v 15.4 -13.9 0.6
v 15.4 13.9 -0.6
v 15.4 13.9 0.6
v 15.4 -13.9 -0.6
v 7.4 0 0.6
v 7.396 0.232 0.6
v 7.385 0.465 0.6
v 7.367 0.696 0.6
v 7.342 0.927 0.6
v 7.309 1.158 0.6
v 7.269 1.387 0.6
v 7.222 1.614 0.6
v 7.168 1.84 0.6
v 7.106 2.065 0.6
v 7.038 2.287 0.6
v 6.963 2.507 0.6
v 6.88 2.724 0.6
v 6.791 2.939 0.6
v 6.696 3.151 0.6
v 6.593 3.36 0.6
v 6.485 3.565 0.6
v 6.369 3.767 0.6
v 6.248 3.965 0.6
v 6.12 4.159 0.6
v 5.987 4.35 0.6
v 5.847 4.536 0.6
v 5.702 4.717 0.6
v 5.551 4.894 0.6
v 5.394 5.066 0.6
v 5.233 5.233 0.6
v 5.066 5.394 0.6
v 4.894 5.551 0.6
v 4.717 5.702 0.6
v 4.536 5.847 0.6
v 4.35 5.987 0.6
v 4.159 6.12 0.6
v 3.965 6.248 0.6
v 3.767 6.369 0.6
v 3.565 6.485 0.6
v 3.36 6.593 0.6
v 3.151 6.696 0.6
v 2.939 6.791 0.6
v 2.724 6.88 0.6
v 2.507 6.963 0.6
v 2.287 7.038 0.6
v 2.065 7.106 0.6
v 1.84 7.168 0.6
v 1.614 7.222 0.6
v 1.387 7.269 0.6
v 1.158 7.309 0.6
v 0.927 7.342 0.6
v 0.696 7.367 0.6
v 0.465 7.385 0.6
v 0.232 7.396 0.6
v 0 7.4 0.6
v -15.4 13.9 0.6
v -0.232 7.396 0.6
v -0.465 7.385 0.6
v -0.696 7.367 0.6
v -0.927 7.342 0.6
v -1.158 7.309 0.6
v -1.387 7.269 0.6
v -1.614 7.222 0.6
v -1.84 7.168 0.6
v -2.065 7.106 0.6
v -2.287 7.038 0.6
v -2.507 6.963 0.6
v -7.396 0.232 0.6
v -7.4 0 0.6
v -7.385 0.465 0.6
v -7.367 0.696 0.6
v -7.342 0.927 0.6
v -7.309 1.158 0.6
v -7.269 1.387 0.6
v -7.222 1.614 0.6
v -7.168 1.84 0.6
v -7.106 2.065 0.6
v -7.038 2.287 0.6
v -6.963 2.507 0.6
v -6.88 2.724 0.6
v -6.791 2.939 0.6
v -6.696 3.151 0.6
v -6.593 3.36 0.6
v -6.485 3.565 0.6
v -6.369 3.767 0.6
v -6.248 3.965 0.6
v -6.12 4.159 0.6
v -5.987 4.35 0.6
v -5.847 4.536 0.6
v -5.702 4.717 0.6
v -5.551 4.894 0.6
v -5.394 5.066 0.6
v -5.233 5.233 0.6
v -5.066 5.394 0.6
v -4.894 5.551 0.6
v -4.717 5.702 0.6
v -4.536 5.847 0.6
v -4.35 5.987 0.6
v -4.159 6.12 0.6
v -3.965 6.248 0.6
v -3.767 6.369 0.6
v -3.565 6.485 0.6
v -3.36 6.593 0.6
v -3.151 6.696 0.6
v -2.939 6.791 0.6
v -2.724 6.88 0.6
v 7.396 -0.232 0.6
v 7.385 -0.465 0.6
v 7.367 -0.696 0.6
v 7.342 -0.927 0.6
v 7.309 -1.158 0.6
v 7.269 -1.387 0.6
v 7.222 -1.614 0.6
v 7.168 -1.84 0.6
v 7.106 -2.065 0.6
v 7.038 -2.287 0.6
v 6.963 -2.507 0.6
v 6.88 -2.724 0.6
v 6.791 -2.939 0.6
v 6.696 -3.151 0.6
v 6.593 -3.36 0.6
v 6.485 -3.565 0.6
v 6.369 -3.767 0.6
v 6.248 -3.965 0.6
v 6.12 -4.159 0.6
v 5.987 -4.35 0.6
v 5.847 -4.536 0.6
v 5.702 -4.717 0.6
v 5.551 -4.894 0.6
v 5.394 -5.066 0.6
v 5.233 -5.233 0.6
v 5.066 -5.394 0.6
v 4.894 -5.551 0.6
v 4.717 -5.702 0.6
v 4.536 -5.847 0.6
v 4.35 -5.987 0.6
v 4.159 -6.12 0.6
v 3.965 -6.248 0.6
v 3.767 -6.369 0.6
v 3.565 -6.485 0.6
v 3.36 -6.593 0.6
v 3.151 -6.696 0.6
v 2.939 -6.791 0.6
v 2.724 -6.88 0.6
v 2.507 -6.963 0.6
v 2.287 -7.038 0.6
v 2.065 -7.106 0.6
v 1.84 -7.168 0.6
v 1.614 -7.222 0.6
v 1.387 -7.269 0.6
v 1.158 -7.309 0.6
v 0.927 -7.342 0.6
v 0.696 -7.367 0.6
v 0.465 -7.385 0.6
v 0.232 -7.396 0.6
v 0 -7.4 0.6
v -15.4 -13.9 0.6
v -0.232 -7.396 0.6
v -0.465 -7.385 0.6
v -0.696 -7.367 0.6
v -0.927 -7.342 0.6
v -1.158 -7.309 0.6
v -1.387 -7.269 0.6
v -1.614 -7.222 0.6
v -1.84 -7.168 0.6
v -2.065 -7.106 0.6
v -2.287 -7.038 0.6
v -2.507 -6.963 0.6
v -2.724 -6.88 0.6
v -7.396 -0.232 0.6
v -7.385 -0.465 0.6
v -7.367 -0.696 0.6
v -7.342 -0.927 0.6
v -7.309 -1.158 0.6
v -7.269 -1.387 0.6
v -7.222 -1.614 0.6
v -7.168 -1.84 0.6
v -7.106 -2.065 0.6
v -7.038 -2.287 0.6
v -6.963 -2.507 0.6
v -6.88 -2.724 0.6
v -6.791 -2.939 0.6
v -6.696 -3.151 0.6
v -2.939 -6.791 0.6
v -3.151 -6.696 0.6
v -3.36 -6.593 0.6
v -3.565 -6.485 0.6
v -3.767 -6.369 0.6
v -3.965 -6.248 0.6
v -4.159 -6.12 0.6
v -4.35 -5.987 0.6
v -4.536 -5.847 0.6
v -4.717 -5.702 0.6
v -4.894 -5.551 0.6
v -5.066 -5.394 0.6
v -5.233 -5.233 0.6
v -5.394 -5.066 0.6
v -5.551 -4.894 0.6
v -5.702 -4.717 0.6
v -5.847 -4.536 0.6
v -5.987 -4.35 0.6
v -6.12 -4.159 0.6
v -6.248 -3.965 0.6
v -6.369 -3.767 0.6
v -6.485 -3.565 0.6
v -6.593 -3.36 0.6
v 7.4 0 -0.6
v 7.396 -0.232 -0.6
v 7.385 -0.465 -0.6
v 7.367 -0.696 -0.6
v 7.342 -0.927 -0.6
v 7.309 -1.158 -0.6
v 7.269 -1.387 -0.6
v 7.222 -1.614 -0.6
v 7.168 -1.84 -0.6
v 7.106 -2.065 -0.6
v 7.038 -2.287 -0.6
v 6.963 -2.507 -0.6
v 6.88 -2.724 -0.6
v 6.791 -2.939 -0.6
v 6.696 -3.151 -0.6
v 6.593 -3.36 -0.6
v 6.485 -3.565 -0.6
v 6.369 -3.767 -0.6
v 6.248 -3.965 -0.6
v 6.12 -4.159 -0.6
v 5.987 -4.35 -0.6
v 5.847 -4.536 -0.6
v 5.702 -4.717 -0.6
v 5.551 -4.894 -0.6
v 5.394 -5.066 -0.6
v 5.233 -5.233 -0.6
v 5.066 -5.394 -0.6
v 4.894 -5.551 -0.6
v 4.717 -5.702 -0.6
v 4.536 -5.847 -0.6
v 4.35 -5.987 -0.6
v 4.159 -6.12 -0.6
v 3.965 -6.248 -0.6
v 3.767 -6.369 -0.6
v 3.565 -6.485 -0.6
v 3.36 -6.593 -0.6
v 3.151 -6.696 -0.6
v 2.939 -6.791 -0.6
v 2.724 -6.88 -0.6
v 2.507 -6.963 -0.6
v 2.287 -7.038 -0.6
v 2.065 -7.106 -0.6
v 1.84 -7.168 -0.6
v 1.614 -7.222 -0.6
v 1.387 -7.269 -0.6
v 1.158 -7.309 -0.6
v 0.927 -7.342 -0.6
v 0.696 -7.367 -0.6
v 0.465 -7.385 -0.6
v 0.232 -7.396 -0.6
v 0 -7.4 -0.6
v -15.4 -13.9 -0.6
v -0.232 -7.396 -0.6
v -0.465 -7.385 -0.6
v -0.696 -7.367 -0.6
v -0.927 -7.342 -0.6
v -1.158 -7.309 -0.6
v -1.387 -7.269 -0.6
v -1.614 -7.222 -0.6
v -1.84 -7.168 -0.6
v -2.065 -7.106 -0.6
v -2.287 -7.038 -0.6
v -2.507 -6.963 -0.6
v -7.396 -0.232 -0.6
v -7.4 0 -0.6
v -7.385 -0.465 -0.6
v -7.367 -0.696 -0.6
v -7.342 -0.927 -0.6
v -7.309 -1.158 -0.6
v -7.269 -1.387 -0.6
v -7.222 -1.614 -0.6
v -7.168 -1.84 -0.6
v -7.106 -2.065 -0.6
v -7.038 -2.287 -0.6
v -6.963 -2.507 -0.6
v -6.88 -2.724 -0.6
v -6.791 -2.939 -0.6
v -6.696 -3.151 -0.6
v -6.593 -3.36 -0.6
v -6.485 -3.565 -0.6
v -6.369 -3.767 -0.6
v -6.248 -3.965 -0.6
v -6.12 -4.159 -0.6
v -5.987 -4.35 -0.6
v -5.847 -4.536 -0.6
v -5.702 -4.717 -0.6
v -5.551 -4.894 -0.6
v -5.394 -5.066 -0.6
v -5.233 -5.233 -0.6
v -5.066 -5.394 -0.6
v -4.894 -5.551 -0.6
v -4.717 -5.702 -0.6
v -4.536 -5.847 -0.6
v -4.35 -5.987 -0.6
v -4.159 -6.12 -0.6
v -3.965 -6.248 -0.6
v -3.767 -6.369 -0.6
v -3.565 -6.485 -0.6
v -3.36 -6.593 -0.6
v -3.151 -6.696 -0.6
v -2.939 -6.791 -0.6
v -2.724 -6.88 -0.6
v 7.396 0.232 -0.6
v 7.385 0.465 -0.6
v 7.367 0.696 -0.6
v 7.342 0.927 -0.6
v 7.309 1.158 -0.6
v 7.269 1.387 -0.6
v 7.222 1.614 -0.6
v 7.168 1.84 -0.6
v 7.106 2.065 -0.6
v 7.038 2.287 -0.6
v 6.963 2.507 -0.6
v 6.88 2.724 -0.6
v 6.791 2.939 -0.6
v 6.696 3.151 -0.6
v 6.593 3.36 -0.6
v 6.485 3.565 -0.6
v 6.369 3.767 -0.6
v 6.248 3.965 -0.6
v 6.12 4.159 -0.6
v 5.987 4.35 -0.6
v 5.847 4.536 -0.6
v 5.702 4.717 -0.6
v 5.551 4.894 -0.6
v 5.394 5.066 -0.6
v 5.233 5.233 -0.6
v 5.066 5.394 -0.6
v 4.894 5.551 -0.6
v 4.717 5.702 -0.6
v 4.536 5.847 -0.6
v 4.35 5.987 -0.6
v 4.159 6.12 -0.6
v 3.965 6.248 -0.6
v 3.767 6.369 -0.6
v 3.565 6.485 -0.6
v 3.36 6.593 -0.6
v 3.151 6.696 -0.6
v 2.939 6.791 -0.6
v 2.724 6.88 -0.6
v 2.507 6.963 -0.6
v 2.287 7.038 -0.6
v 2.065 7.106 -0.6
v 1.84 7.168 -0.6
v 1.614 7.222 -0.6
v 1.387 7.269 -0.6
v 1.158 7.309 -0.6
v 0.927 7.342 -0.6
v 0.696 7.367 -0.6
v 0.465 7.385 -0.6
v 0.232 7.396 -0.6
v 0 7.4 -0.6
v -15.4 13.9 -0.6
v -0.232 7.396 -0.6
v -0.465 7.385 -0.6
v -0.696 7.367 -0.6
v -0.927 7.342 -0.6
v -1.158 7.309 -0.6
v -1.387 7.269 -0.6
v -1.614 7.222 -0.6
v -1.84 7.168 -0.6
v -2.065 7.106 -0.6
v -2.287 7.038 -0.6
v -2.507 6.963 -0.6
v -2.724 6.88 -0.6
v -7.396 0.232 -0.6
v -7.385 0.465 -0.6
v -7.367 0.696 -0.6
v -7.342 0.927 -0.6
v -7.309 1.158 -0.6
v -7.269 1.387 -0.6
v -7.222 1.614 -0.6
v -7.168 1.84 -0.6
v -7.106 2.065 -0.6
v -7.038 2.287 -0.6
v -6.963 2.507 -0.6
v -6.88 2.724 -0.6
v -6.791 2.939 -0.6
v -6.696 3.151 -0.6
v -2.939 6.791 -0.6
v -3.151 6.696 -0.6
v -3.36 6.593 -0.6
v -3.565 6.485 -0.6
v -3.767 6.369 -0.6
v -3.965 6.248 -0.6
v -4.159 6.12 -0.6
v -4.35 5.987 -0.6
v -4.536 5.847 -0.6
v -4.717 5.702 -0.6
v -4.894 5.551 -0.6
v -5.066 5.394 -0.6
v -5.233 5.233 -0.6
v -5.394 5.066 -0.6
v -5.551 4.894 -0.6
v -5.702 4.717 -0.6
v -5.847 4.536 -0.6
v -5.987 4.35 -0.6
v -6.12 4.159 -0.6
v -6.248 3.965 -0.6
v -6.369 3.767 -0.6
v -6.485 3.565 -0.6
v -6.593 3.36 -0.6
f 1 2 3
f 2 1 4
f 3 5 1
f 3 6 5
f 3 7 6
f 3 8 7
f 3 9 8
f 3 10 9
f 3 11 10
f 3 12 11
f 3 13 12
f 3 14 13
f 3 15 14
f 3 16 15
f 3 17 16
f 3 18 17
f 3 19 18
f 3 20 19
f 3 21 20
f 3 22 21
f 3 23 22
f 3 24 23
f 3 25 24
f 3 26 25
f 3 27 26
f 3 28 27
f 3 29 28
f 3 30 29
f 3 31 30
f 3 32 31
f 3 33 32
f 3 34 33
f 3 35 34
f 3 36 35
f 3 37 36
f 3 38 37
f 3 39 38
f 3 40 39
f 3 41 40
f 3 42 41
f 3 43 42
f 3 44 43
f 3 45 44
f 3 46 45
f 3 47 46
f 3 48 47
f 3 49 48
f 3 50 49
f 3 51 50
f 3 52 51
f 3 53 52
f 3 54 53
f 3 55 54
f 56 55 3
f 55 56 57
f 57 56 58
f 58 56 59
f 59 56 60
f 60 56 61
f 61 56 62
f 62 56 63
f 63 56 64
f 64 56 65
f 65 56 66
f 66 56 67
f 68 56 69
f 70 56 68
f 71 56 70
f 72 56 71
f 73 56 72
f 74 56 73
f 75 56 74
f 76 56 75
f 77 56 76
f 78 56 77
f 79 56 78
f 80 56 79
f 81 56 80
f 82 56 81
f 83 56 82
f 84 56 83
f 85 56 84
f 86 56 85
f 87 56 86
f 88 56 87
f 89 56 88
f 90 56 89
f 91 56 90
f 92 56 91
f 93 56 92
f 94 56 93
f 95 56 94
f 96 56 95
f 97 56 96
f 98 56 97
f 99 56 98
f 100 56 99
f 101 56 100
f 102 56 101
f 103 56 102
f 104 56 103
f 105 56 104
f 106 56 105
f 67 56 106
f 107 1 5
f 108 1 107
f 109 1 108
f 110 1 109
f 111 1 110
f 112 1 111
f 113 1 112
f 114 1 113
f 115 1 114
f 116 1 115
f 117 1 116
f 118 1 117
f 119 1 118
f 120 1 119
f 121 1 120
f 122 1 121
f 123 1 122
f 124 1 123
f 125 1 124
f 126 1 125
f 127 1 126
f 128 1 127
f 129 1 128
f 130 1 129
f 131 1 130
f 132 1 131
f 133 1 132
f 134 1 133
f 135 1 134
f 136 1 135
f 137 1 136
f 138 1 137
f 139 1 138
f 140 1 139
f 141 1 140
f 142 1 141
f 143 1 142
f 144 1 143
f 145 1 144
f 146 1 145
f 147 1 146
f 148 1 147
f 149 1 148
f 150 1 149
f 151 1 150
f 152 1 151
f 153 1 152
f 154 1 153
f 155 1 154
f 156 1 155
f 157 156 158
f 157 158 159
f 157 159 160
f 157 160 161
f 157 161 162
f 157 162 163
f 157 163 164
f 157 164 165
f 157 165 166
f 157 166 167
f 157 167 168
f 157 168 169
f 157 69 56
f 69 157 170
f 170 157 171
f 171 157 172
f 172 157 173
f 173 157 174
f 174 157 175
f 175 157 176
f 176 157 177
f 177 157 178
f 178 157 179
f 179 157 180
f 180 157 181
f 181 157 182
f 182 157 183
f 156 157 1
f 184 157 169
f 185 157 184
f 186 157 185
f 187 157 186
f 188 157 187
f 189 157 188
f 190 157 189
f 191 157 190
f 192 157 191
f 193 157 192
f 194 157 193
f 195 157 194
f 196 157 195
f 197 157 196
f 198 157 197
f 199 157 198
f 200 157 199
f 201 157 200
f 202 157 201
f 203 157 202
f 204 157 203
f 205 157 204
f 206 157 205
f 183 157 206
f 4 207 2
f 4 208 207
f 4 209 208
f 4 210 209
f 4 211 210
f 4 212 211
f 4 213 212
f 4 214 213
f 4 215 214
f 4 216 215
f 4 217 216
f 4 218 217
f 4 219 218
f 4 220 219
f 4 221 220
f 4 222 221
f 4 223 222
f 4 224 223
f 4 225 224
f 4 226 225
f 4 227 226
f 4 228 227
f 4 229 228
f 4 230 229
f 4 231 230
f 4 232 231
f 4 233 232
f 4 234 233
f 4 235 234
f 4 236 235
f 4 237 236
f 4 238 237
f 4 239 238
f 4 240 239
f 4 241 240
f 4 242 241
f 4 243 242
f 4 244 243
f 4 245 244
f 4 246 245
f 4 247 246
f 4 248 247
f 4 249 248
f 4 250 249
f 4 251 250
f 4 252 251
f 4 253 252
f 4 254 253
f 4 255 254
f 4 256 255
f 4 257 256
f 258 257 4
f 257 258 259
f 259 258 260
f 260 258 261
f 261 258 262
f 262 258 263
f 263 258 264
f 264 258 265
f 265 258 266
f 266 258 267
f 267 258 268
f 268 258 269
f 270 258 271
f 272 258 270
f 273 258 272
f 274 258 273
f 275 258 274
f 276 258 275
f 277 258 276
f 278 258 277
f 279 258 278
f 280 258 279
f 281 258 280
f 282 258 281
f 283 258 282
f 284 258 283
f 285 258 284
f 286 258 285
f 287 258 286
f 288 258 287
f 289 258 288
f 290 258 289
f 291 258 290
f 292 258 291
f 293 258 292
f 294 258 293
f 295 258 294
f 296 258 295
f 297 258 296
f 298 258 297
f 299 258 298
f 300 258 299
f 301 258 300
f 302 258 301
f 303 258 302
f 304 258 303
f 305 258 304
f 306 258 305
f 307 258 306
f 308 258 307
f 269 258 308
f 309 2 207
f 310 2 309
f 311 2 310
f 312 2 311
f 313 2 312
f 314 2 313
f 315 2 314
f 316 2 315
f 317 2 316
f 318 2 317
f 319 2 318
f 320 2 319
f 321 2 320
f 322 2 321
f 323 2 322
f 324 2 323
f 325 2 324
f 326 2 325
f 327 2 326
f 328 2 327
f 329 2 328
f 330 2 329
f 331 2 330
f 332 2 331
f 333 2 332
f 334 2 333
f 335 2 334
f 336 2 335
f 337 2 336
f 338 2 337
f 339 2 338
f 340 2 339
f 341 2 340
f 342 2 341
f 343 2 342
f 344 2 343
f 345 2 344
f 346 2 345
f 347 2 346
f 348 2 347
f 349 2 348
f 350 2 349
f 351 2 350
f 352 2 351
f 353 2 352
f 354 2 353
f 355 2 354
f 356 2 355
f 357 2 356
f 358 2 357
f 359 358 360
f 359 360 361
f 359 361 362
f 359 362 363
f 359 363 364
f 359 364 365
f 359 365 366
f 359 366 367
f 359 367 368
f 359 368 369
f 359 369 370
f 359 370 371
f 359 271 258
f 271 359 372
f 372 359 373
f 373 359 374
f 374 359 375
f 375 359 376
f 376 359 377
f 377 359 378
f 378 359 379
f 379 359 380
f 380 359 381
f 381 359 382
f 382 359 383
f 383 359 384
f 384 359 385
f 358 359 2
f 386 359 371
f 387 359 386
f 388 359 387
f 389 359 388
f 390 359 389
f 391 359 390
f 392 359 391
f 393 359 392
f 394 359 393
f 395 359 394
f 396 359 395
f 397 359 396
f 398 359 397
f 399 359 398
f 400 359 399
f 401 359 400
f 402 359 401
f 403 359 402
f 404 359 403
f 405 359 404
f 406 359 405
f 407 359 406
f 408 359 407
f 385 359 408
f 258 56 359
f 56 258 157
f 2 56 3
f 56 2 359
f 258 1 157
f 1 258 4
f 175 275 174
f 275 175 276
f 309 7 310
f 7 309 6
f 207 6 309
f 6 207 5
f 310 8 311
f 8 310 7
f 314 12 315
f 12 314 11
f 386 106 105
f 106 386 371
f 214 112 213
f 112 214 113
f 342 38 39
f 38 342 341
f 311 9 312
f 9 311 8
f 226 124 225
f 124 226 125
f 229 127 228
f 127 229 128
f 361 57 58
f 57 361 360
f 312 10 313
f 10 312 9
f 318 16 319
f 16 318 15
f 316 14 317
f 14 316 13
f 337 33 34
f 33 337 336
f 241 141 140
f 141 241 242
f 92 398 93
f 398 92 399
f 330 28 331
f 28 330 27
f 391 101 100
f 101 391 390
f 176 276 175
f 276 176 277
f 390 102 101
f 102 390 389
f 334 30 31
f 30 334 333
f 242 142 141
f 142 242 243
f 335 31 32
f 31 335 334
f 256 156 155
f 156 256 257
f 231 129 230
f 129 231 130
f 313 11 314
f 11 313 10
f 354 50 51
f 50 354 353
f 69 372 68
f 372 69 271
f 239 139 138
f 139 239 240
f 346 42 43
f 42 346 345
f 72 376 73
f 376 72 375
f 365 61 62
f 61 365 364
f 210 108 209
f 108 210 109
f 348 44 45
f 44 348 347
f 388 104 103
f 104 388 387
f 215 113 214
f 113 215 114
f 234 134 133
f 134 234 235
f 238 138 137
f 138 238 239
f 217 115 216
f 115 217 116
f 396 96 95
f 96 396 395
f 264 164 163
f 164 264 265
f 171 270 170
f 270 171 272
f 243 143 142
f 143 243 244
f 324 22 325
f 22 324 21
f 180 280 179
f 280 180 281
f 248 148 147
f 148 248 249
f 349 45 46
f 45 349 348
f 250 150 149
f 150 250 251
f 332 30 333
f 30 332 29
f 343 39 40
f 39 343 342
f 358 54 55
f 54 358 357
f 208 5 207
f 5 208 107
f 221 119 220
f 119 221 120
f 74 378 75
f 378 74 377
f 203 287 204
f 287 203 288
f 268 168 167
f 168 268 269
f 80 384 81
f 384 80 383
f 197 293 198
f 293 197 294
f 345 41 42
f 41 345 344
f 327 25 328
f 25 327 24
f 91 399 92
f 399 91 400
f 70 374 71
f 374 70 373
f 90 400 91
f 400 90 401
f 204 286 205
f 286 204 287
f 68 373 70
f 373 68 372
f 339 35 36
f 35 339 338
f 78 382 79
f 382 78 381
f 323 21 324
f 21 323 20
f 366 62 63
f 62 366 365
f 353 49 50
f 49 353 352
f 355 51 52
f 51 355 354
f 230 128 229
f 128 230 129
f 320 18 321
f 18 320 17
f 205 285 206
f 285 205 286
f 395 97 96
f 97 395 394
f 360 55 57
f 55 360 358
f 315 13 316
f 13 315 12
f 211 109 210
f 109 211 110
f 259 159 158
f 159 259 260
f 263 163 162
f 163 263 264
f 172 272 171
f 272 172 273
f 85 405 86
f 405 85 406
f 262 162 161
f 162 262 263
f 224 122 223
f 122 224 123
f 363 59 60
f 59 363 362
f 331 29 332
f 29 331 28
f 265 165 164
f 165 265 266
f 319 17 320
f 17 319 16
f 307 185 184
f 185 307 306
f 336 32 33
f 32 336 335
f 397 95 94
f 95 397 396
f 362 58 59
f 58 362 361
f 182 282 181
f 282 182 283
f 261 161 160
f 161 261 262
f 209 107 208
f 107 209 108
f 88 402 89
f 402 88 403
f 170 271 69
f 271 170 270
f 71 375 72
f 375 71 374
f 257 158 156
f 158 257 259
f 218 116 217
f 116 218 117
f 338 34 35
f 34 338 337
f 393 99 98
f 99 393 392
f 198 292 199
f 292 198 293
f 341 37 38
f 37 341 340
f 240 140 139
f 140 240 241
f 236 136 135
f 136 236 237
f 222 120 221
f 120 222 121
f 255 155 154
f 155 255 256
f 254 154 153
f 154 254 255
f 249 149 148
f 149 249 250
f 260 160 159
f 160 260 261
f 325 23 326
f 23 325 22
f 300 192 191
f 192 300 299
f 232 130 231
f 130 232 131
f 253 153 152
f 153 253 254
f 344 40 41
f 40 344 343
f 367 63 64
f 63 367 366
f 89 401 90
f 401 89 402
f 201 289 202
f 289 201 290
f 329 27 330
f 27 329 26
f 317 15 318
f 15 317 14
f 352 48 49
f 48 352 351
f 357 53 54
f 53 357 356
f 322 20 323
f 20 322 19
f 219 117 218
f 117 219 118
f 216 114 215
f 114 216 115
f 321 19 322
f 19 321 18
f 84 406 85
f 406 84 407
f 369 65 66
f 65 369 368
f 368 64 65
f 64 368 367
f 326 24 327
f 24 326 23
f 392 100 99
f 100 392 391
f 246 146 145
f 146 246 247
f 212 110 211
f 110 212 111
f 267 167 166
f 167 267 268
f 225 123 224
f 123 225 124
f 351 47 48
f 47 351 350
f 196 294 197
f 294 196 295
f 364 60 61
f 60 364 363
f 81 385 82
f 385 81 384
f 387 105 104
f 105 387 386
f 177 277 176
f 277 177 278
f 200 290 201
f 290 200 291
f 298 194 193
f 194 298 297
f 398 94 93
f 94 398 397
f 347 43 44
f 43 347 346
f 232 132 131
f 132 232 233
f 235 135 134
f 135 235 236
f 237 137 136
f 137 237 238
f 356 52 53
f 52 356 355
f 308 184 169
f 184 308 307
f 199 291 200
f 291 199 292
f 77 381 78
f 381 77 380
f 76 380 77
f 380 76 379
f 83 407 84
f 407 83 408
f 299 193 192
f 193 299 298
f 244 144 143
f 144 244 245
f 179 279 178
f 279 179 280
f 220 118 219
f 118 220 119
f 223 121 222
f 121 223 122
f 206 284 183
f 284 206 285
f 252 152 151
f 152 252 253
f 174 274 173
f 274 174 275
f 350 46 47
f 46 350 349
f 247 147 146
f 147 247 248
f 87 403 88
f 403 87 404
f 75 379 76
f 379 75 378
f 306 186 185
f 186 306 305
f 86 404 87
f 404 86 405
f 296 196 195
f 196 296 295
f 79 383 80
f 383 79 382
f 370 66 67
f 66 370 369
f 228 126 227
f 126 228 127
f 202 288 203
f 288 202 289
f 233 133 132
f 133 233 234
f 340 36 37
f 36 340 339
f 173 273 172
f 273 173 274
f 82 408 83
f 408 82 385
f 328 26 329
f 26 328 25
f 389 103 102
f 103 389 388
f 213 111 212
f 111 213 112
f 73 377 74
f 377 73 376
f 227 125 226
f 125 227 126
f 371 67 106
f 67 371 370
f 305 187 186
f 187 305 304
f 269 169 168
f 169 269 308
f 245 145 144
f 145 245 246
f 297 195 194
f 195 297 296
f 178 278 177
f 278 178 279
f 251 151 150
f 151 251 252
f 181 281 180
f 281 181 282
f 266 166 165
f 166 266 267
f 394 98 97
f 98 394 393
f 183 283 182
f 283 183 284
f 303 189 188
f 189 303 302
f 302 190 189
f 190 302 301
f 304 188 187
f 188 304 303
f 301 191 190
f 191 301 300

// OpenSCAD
module bottom(){
    difference(){
        union(){
            cube([30.4,27.4,1.2]);
            
            translate([4,23.5,0.5])difference(){
                cylinder(r=2,h=5,$fn=200);
                cylinder(r=1,h=5,$fn=200);
            }

            translate([27,3.5,0.5])difference(){
                cylinder(r=2,h=5,$fn=200);
                cylinder(r=1,h=5,$fn=200);
            }

            translate([6,13.5,0.5])difference(){
                cylinder(r=2,h=5,$fn=200);
                cylinder(r=1,h=5,$fn=200);
            }

            translate([24,13.5,0.5])difference(){
                cylinder(r=2,h=5,$fn=200);
                cylinder(r=1,h=5,$fn=200);
            }
        }

        translate([15.2,13.7,0])difference(){
            cylinder(r=4.4,h=1.2,$fn=200);
            
            translate([0.1,-0.1,0])linear_extrude(1.2){
                text("❄",size = 7,valign = "center",halign = "center",font = "Segoe UI Emoji",$fn=100);
            }

        }
    }
}

module hall(){
    difference(){
        cube([33.6,30.6,25],center=true);
        cube([31.2,28.2,25],center=true);
        translate([14,0,-5])rotate([0,90,0])cylinder(r=2,h=5,$fn=200);
    }
}

module top(){
    difference(){
        cube([30.8,27.8,1.2],center=true);
        cylinder(r=7.4,h=10,$fn=200,center=true);
    }
}

top();
